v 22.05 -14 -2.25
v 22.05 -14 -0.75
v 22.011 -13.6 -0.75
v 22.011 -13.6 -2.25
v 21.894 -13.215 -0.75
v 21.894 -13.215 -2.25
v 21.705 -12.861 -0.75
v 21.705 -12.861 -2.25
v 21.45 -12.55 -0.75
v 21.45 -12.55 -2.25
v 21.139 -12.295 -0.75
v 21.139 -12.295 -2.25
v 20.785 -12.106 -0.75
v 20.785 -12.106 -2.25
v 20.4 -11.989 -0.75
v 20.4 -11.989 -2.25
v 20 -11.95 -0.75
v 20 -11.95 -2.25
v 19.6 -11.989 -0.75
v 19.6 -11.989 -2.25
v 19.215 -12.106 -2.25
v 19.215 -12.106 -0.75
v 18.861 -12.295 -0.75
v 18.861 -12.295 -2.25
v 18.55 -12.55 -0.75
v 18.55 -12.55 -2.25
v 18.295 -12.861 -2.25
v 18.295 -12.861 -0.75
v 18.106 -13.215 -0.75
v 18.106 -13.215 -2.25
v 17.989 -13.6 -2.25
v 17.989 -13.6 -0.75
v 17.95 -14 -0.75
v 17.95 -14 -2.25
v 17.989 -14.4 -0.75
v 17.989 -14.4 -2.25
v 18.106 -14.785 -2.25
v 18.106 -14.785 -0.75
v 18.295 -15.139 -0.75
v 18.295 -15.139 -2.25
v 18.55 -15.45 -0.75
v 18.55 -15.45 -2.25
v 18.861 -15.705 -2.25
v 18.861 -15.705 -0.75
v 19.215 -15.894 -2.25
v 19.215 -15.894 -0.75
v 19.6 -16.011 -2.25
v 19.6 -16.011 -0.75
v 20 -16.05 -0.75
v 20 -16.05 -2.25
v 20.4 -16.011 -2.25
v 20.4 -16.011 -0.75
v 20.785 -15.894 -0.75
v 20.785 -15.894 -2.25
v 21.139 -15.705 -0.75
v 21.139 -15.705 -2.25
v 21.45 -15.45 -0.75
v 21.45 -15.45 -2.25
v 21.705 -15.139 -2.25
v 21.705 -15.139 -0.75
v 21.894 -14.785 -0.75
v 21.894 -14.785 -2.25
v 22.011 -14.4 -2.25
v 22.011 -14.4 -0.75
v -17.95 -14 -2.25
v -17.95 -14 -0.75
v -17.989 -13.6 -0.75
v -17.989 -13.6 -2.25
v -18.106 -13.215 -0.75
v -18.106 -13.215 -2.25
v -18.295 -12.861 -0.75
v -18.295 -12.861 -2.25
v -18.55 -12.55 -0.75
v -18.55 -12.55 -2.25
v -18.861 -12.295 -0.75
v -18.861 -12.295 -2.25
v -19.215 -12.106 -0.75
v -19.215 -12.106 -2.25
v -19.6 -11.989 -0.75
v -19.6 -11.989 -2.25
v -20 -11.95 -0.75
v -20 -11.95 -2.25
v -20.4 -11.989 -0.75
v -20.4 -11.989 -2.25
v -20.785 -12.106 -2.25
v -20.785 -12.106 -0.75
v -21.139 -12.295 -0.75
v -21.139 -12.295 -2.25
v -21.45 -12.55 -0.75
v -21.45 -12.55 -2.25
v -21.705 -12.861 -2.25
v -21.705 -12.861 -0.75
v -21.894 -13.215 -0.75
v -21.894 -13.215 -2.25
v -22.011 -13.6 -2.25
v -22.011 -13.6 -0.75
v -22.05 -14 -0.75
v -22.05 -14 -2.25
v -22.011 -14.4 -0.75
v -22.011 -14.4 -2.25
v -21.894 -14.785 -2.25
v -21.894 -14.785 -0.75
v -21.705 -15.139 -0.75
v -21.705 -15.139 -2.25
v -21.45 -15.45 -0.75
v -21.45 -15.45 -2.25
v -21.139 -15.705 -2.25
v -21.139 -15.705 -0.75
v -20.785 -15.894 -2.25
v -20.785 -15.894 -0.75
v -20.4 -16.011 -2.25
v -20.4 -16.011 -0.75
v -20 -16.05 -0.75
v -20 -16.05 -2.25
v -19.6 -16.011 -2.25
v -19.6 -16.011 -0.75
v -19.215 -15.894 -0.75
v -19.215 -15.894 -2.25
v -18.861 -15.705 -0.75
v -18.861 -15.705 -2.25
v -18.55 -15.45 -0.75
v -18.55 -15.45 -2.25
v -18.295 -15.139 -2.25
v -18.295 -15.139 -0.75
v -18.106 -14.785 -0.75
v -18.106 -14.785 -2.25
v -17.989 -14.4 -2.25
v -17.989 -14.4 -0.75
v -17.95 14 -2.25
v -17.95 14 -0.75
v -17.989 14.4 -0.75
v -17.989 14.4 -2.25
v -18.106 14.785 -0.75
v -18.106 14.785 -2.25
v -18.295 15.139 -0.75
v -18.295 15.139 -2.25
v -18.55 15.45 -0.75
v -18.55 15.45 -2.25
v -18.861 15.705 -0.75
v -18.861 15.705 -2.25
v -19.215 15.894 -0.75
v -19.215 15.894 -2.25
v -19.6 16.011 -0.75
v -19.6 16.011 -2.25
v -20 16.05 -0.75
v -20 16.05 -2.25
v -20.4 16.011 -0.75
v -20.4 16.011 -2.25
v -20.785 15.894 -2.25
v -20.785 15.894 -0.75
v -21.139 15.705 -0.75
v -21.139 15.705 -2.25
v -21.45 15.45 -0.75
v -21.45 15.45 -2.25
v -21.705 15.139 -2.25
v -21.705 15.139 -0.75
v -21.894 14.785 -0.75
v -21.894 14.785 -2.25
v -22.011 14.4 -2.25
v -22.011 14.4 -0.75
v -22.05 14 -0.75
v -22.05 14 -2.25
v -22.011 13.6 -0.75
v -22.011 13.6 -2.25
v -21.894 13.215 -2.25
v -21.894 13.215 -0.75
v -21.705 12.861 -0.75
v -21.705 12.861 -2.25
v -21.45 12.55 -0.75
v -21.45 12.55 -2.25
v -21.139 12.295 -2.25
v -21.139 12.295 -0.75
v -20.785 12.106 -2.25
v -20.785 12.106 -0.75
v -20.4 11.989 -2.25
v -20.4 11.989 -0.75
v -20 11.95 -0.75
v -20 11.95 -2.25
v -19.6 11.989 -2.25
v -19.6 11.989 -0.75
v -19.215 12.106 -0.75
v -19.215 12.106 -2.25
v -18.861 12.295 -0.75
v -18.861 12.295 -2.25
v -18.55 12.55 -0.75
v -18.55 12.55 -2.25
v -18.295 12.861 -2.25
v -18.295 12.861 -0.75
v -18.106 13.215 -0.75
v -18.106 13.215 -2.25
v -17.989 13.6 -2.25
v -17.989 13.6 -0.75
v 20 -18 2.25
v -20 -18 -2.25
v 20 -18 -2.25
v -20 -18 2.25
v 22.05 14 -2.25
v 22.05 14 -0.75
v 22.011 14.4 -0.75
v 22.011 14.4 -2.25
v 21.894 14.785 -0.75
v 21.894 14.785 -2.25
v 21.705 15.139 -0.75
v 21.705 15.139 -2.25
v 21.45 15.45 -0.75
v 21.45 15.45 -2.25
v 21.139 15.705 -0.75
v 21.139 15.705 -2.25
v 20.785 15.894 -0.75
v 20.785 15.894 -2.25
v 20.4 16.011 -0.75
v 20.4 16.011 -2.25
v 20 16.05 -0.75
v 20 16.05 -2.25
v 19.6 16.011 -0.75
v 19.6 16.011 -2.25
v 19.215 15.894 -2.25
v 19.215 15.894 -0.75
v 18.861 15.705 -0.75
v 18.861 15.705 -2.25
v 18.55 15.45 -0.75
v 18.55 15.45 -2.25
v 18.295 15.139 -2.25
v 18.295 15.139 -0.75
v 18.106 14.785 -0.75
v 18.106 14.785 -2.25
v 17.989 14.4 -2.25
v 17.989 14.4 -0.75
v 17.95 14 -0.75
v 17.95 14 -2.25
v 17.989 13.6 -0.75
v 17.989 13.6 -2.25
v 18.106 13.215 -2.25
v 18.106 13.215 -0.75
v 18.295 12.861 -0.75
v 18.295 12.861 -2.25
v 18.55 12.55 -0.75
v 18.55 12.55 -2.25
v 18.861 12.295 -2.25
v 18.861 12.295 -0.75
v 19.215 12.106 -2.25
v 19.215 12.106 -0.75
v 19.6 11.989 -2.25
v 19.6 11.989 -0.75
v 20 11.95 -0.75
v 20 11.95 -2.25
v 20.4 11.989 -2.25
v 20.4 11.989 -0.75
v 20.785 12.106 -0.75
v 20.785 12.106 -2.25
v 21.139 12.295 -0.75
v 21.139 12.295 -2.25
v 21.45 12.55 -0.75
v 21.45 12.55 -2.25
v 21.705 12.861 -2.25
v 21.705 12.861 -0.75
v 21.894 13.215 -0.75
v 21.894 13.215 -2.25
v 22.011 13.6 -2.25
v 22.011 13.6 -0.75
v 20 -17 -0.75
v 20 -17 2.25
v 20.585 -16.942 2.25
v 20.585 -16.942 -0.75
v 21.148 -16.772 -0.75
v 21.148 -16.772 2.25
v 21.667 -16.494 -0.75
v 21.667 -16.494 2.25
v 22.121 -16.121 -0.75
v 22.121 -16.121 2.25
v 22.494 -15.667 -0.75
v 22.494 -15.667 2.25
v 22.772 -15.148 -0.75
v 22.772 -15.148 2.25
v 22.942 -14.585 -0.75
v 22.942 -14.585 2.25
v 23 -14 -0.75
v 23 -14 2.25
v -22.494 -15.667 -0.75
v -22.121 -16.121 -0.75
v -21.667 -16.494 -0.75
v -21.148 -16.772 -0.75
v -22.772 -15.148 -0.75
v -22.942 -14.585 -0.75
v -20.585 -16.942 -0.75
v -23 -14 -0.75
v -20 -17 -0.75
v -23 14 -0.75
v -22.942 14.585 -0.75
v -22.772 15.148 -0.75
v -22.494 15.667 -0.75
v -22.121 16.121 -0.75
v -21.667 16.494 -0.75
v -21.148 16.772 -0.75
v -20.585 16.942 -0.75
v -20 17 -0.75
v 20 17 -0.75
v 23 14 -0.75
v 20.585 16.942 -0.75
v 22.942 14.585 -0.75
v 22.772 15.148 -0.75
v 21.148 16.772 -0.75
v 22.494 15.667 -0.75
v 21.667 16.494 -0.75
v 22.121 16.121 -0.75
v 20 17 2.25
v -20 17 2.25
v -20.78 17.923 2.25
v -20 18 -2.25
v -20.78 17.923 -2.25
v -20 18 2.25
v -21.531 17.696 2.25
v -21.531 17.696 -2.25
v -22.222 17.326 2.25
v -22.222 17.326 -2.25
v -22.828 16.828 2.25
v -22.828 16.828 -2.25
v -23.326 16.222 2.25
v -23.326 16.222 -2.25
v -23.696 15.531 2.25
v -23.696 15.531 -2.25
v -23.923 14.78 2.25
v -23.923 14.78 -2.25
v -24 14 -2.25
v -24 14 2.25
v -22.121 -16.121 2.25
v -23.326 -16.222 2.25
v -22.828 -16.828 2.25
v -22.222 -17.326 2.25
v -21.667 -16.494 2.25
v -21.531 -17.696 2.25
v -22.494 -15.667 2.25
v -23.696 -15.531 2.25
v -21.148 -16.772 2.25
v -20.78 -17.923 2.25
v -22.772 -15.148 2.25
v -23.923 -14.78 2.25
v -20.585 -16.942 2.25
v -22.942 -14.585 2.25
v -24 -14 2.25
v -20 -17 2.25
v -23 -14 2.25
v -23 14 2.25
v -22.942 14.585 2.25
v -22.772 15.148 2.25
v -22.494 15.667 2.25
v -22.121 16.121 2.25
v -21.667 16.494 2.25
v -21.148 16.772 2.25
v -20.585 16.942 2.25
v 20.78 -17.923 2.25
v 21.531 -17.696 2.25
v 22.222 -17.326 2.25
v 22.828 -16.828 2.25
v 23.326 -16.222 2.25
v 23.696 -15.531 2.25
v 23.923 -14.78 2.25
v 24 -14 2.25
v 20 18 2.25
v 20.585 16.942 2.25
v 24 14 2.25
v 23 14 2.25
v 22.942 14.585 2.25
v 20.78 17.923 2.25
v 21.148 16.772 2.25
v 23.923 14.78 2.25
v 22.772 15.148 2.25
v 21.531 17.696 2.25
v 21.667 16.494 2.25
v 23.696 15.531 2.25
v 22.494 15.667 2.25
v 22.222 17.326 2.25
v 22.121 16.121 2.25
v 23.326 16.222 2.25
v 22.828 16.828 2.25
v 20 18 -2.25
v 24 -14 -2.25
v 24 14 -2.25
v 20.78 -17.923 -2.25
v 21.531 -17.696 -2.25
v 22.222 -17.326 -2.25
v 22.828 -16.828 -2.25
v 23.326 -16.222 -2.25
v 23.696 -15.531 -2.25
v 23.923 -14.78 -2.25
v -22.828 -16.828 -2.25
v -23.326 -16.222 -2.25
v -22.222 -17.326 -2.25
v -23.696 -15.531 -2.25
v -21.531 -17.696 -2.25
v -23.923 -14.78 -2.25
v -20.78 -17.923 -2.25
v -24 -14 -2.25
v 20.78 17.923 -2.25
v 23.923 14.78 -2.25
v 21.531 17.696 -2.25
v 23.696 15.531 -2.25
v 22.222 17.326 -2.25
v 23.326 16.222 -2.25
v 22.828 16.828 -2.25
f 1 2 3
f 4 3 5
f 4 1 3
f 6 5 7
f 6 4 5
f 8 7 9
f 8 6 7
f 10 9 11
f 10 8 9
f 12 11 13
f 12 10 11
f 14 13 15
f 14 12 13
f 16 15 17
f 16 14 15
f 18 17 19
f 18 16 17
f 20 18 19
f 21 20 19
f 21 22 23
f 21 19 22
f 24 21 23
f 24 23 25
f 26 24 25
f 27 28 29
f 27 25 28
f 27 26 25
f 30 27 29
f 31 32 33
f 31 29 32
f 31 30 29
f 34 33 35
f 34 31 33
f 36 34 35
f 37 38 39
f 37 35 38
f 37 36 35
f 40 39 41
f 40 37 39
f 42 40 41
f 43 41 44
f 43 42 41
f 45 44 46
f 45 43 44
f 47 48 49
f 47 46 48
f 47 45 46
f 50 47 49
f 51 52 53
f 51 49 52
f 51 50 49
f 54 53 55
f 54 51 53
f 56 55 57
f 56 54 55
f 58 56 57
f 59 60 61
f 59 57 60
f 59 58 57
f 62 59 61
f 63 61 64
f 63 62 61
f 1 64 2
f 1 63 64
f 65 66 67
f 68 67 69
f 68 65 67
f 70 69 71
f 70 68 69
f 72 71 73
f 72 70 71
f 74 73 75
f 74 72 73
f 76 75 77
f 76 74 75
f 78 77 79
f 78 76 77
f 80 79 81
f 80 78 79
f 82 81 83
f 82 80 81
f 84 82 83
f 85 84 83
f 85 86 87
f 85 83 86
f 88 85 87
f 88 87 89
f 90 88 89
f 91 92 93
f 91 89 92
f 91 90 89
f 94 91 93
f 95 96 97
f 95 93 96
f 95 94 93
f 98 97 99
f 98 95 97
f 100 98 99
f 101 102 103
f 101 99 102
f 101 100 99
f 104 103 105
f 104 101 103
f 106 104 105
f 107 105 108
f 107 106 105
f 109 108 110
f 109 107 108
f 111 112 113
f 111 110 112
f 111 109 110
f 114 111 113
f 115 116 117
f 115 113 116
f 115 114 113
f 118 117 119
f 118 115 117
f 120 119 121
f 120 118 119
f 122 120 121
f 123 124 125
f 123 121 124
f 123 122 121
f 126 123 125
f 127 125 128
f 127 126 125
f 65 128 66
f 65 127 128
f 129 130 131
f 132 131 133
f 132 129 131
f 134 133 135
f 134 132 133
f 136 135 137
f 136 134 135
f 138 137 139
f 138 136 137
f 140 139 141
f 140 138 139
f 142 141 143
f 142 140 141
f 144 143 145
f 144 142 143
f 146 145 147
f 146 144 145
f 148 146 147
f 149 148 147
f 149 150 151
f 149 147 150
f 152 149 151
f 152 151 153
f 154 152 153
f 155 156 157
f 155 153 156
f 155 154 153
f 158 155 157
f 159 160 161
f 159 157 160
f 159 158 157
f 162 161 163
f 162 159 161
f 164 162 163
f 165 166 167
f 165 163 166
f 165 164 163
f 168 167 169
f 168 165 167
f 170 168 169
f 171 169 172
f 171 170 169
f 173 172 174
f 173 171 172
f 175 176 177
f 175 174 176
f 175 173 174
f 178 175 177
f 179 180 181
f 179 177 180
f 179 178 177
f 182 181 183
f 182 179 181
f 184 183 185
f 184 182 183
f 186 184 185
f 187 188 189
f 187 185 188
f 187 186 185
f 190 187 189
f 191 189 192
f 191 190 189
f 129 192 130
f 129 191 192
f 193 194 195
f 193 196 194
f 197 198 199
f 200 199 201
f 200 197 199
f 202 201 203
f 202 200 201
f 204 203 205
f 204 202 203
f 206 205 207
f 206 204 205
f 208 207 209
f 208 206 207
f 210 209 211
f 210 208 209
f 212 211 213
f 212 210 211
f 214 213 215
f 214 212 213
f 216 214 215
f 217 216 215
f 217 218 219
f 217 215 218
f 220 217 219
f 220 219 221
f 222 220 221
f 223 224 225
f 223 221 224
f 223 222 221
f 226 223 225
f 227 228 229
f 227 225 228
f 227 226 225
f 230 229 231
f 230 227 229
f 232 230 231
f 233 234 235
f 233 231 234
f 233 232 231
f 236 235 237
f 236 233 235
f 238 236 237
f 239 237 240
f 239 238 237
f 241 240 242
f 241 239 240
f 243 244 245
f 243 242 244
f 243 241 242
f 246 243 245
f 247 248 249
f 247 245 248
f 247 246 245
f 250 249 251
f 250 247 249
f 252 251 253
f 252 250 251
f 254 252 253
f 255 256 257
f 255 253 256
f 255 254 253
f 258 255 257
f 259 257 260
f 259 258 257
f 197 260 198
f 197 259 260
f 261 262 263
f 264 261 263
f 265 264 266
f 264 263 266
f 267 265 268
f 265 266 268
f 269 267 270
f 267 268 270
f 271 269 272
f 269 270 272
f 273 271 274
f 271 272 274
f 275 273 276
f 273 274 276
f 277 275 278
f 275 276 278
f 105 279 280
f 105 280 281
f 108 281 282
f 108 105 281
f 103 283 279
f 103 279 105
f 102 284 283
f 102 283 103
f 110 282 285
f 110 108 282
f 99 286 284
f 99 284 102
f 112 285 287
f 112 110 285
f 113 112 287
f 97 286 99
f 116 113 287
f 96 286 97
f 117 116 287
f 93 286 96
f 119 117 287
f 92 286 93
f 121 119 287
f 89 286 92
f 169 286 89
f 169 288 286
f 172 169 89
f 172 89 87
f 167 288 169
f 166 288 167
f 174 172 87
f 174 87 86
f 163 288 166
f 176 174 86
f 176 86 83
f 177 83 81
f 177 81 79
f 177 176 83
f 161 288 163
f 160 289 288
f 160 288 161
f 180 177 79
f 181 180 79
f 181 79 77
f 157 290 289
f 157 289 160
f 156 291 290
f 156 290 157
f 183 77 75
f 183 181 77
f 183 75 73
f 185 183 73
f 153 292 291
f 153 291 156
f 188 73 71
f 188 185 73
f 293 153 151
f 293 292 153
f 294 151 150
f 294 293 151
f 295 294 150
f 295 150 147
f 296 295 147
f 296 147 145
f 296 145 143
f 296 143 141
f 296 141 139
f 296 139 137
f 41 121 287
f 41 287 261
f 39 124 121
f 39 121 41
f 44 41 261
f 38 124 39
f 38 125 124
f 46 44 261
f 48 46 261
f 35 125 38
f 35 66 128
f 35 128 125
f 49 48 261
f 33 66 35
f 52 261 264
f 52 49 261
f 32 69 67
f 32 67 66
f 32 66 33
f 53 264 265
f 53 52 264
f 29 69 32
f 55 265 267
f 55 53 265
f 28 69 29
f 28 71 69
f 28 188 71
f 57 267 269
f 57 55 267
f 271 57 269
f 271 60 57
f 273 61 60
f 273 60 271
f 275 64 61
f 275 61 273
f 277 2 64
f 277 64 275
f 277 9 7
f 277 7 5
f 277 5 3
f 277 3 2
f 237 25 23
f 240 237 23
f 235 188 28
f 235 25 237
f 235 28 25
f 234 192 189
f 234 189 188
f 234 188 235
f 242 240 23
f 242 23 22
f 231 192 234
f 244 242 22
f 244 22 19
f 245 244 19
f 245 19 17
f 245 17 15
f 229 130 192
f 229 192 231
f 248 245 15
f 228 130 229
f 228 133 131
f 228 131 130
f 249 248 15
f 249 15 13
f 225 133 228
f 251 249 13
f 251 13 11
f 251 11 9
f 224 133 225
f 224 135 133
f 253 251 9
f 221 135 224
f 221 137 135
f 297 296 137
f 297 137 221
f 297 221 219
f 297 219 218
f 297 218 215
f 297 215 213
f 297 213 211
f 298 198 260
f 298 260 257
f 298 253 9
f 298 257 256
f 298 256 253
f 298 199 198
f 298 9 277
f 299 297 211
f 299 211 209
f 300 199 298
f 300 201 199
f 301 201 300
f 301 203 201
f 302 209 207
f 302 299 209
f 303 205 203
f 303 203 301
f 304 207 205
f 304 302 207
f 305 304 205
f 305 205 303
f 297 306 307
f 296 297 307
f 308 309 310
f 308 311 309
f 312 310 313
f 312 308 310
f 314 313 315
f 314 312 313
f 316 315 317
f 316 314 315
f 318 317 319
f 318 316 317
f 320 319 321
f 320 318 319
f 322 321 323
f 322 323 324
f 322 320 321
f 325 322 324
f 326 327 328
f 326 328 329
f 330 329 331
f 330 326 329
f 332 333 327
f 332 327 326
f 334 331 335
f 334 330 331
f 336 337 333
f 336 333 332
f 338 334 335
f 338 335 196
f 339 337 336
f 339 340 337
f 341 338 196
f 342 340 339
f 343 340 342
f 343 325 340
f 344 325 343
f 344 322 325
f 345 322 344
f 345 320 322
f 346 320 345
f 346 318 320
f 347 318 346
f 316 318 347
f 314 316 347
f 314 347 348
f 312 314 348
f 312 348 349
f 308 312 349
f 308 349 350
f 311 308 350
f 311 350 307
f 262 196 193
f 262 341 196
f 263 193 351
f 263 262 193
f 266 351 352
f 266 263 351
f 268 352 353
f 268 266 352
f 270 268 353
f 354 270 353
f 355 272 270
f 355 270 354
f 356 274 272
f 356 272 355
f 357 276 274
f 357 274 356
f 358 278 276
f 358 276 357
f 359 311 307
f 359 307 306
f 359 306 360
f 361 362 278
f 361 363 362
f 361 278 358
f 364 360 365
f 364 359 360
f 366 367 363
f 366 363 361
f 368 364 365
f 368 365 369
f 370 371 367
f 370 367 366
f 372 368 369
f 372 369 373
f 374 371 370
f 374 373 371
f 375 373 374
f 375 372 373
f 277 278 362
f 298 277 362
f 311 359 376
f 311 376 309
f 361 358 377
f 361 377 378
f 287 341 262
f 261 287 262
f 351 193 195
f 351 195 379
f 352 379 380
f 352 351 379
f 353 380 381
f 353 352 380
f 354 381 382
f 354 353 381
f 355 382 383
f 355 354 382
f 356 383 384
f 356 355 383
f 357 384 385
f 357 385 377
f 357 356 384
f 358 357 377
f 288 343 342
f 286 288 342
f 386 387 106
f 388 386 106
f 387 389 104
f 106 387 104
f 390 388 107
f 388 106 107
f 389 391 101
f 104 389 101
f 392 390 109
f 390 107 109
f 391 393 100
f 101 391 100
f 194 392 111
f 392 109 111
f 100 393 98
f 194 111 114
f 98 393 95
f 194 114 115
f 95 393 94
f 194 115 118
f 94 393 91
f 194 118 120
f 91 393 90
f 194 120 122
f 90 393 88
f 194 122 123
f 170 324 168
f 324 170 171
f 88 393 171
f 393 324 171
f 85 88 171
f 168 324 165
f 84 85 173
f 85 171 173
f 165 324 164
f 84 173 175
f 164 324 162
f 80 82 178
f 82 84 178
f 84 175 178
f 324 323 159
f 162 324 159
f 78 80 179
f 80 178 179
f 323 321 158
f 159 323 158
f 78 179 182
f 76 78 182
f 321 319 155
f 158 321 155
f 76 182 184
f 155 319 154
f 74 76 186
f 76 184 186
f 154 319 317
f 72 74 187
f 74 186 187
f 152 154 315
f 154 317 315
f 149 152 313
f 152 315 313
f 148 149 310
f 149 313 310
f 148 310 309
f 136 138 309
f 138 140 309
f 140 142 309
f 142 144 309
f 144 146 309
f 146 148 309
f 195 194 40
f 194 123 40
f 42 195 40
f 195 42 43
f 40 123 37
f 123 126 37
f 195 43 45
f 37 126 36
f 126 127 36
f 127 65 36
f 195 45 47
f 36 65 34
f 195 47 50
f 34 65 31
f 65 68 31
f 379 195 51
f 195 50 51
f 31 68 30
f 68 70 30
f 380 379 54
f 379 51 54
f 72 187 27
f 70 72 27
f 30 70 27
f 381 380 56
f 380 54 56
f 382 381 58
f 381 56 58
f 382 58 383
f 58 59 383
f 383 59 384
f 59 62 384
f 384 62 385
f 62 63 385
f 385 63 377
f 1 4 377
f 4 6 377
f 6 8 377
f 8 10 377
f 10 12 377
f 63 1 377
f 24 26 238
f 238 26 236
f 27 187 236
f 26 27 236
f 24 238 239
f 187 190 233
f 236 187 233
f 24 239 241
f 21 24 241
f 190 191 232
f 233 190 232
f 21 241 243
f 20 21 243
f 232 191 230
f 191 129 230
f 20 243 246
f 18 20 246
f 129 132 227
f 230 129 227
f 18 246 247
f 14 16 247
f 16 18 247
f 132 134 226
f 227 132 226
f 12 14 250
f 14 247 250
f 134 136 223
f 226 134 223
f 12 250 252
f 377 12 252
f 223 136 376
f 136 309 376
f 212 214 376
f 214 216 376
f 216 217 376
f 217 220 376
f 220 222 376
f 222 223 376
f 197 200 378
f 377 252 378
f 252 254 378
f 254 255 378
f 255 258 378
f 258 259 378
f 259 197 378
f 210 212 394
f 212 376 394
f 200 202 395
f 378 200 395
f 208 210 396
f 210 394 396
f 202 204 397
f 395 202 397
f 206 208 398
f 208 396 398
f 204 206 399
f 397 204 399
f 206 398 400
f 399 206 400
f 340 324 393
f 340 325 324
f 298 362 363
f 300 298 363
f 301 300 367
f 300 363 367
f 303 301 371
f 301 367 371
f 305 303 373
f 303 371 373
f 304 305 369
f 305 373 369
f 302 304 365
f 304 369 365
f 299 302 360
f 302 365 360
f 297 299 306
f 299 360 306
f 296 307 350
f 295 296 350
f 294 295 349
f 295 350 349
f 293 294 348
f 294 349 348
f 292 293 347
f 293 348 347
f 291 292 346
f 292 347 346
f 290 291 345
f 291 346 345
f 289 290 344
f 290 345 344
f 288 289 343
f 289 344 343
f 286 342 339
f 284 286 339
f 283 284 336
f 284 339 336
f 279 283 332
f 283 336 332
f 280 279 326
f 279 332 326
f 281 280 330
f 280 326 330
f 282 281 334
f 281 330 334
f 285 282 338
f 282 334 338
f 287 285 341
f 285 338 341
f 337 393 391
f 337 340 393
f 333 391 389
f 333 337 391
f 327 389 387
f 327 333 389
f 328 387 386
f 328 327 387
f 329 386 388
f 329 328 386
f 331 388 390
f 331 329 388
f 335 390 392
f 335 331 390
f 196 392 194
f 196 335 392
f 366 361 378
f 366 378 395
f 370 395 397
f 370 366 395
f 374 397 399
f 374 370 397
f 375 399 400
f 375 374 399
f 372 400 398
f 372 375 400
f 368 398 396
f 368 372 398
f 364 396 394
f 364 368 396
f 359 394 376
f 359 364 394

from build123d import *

# Parameters (mm, degrees)
SKETCH1_R           = 2.05
BOSS_EXTRUDE1_DEPTH = 2.25
CUT_EXTRUDE2_DEPTH  = 3


with BuildPart() as part:
    # Sketch1 → Boss-Extrude1 (new, symmetric)
    with BuildSketch(Plane.XY):
        with BuildLine():
            Line((-20, -18), (20, -18))
            ThreePointArc((20, -18), (22.828427125, -16.828427125), (24, -14))
            Line((24, -14), (24, 14))
            ThreePointArc((24, 14), (22.828427125, 16.828427125), (20, 18))
            Line((20, 18), (-20, 18))
            ThreePointArc((-20, 18), (-22.828427125, 16.828427125), (-24, 14))
            Line((-24, 14), (-24, -14))
            ThreePointArc((-24, -14), (-22.828427125, -16.828427125), (-20, -18))
        make_face()
        with Locations((-20, -14)):
            Circle(SKETCH1_R, mode=Mode.SUBTRACT)
        with Locations((-20, 14)):
            Circle(SKETCH1_R, mode=Mode.SUBTRACT)
        with Locations((20, 14)):
            Circle(SKETCH1_R, mode=Mode.SUBTRACT)
        with Locations((20, -14)):
            Circle(SKETCH1_R, mode=Mode.SUBTRACT)
    extrude(amount=BOSS_EXTRUDE1_DEPTH, both=True)

    # Sketch3 → Cut-Extrude2 (cut)
    with BuildSketch(Plane.XY.offset(2.25)):
        with BuildLine():
            Line((23, -14), (23, 14))
            ThreePointArc((23, 14), (22.121320344, 16.121320344), (20, 17))
            Line((20, 17), (-20, 17))
            ThreePointArc((-20, 17), (-22.121320344, 16.121320344), (-23, 14))
            Line((-23, 14), (-23, -14))
            ThreePointArc((-23, -14), (-22.121320344, -16.121320344), (-20, -17))
            Line((-20, -17), (20, -17))
            ThreePointArc((20, -17), (22.121320344, -16.121320344), (23, -14))
        make_face()
    extrude(amount=-CUT_EXTRUDE2_DEPTH, mode=Mode.SUBTRACT)


solid = part.part
